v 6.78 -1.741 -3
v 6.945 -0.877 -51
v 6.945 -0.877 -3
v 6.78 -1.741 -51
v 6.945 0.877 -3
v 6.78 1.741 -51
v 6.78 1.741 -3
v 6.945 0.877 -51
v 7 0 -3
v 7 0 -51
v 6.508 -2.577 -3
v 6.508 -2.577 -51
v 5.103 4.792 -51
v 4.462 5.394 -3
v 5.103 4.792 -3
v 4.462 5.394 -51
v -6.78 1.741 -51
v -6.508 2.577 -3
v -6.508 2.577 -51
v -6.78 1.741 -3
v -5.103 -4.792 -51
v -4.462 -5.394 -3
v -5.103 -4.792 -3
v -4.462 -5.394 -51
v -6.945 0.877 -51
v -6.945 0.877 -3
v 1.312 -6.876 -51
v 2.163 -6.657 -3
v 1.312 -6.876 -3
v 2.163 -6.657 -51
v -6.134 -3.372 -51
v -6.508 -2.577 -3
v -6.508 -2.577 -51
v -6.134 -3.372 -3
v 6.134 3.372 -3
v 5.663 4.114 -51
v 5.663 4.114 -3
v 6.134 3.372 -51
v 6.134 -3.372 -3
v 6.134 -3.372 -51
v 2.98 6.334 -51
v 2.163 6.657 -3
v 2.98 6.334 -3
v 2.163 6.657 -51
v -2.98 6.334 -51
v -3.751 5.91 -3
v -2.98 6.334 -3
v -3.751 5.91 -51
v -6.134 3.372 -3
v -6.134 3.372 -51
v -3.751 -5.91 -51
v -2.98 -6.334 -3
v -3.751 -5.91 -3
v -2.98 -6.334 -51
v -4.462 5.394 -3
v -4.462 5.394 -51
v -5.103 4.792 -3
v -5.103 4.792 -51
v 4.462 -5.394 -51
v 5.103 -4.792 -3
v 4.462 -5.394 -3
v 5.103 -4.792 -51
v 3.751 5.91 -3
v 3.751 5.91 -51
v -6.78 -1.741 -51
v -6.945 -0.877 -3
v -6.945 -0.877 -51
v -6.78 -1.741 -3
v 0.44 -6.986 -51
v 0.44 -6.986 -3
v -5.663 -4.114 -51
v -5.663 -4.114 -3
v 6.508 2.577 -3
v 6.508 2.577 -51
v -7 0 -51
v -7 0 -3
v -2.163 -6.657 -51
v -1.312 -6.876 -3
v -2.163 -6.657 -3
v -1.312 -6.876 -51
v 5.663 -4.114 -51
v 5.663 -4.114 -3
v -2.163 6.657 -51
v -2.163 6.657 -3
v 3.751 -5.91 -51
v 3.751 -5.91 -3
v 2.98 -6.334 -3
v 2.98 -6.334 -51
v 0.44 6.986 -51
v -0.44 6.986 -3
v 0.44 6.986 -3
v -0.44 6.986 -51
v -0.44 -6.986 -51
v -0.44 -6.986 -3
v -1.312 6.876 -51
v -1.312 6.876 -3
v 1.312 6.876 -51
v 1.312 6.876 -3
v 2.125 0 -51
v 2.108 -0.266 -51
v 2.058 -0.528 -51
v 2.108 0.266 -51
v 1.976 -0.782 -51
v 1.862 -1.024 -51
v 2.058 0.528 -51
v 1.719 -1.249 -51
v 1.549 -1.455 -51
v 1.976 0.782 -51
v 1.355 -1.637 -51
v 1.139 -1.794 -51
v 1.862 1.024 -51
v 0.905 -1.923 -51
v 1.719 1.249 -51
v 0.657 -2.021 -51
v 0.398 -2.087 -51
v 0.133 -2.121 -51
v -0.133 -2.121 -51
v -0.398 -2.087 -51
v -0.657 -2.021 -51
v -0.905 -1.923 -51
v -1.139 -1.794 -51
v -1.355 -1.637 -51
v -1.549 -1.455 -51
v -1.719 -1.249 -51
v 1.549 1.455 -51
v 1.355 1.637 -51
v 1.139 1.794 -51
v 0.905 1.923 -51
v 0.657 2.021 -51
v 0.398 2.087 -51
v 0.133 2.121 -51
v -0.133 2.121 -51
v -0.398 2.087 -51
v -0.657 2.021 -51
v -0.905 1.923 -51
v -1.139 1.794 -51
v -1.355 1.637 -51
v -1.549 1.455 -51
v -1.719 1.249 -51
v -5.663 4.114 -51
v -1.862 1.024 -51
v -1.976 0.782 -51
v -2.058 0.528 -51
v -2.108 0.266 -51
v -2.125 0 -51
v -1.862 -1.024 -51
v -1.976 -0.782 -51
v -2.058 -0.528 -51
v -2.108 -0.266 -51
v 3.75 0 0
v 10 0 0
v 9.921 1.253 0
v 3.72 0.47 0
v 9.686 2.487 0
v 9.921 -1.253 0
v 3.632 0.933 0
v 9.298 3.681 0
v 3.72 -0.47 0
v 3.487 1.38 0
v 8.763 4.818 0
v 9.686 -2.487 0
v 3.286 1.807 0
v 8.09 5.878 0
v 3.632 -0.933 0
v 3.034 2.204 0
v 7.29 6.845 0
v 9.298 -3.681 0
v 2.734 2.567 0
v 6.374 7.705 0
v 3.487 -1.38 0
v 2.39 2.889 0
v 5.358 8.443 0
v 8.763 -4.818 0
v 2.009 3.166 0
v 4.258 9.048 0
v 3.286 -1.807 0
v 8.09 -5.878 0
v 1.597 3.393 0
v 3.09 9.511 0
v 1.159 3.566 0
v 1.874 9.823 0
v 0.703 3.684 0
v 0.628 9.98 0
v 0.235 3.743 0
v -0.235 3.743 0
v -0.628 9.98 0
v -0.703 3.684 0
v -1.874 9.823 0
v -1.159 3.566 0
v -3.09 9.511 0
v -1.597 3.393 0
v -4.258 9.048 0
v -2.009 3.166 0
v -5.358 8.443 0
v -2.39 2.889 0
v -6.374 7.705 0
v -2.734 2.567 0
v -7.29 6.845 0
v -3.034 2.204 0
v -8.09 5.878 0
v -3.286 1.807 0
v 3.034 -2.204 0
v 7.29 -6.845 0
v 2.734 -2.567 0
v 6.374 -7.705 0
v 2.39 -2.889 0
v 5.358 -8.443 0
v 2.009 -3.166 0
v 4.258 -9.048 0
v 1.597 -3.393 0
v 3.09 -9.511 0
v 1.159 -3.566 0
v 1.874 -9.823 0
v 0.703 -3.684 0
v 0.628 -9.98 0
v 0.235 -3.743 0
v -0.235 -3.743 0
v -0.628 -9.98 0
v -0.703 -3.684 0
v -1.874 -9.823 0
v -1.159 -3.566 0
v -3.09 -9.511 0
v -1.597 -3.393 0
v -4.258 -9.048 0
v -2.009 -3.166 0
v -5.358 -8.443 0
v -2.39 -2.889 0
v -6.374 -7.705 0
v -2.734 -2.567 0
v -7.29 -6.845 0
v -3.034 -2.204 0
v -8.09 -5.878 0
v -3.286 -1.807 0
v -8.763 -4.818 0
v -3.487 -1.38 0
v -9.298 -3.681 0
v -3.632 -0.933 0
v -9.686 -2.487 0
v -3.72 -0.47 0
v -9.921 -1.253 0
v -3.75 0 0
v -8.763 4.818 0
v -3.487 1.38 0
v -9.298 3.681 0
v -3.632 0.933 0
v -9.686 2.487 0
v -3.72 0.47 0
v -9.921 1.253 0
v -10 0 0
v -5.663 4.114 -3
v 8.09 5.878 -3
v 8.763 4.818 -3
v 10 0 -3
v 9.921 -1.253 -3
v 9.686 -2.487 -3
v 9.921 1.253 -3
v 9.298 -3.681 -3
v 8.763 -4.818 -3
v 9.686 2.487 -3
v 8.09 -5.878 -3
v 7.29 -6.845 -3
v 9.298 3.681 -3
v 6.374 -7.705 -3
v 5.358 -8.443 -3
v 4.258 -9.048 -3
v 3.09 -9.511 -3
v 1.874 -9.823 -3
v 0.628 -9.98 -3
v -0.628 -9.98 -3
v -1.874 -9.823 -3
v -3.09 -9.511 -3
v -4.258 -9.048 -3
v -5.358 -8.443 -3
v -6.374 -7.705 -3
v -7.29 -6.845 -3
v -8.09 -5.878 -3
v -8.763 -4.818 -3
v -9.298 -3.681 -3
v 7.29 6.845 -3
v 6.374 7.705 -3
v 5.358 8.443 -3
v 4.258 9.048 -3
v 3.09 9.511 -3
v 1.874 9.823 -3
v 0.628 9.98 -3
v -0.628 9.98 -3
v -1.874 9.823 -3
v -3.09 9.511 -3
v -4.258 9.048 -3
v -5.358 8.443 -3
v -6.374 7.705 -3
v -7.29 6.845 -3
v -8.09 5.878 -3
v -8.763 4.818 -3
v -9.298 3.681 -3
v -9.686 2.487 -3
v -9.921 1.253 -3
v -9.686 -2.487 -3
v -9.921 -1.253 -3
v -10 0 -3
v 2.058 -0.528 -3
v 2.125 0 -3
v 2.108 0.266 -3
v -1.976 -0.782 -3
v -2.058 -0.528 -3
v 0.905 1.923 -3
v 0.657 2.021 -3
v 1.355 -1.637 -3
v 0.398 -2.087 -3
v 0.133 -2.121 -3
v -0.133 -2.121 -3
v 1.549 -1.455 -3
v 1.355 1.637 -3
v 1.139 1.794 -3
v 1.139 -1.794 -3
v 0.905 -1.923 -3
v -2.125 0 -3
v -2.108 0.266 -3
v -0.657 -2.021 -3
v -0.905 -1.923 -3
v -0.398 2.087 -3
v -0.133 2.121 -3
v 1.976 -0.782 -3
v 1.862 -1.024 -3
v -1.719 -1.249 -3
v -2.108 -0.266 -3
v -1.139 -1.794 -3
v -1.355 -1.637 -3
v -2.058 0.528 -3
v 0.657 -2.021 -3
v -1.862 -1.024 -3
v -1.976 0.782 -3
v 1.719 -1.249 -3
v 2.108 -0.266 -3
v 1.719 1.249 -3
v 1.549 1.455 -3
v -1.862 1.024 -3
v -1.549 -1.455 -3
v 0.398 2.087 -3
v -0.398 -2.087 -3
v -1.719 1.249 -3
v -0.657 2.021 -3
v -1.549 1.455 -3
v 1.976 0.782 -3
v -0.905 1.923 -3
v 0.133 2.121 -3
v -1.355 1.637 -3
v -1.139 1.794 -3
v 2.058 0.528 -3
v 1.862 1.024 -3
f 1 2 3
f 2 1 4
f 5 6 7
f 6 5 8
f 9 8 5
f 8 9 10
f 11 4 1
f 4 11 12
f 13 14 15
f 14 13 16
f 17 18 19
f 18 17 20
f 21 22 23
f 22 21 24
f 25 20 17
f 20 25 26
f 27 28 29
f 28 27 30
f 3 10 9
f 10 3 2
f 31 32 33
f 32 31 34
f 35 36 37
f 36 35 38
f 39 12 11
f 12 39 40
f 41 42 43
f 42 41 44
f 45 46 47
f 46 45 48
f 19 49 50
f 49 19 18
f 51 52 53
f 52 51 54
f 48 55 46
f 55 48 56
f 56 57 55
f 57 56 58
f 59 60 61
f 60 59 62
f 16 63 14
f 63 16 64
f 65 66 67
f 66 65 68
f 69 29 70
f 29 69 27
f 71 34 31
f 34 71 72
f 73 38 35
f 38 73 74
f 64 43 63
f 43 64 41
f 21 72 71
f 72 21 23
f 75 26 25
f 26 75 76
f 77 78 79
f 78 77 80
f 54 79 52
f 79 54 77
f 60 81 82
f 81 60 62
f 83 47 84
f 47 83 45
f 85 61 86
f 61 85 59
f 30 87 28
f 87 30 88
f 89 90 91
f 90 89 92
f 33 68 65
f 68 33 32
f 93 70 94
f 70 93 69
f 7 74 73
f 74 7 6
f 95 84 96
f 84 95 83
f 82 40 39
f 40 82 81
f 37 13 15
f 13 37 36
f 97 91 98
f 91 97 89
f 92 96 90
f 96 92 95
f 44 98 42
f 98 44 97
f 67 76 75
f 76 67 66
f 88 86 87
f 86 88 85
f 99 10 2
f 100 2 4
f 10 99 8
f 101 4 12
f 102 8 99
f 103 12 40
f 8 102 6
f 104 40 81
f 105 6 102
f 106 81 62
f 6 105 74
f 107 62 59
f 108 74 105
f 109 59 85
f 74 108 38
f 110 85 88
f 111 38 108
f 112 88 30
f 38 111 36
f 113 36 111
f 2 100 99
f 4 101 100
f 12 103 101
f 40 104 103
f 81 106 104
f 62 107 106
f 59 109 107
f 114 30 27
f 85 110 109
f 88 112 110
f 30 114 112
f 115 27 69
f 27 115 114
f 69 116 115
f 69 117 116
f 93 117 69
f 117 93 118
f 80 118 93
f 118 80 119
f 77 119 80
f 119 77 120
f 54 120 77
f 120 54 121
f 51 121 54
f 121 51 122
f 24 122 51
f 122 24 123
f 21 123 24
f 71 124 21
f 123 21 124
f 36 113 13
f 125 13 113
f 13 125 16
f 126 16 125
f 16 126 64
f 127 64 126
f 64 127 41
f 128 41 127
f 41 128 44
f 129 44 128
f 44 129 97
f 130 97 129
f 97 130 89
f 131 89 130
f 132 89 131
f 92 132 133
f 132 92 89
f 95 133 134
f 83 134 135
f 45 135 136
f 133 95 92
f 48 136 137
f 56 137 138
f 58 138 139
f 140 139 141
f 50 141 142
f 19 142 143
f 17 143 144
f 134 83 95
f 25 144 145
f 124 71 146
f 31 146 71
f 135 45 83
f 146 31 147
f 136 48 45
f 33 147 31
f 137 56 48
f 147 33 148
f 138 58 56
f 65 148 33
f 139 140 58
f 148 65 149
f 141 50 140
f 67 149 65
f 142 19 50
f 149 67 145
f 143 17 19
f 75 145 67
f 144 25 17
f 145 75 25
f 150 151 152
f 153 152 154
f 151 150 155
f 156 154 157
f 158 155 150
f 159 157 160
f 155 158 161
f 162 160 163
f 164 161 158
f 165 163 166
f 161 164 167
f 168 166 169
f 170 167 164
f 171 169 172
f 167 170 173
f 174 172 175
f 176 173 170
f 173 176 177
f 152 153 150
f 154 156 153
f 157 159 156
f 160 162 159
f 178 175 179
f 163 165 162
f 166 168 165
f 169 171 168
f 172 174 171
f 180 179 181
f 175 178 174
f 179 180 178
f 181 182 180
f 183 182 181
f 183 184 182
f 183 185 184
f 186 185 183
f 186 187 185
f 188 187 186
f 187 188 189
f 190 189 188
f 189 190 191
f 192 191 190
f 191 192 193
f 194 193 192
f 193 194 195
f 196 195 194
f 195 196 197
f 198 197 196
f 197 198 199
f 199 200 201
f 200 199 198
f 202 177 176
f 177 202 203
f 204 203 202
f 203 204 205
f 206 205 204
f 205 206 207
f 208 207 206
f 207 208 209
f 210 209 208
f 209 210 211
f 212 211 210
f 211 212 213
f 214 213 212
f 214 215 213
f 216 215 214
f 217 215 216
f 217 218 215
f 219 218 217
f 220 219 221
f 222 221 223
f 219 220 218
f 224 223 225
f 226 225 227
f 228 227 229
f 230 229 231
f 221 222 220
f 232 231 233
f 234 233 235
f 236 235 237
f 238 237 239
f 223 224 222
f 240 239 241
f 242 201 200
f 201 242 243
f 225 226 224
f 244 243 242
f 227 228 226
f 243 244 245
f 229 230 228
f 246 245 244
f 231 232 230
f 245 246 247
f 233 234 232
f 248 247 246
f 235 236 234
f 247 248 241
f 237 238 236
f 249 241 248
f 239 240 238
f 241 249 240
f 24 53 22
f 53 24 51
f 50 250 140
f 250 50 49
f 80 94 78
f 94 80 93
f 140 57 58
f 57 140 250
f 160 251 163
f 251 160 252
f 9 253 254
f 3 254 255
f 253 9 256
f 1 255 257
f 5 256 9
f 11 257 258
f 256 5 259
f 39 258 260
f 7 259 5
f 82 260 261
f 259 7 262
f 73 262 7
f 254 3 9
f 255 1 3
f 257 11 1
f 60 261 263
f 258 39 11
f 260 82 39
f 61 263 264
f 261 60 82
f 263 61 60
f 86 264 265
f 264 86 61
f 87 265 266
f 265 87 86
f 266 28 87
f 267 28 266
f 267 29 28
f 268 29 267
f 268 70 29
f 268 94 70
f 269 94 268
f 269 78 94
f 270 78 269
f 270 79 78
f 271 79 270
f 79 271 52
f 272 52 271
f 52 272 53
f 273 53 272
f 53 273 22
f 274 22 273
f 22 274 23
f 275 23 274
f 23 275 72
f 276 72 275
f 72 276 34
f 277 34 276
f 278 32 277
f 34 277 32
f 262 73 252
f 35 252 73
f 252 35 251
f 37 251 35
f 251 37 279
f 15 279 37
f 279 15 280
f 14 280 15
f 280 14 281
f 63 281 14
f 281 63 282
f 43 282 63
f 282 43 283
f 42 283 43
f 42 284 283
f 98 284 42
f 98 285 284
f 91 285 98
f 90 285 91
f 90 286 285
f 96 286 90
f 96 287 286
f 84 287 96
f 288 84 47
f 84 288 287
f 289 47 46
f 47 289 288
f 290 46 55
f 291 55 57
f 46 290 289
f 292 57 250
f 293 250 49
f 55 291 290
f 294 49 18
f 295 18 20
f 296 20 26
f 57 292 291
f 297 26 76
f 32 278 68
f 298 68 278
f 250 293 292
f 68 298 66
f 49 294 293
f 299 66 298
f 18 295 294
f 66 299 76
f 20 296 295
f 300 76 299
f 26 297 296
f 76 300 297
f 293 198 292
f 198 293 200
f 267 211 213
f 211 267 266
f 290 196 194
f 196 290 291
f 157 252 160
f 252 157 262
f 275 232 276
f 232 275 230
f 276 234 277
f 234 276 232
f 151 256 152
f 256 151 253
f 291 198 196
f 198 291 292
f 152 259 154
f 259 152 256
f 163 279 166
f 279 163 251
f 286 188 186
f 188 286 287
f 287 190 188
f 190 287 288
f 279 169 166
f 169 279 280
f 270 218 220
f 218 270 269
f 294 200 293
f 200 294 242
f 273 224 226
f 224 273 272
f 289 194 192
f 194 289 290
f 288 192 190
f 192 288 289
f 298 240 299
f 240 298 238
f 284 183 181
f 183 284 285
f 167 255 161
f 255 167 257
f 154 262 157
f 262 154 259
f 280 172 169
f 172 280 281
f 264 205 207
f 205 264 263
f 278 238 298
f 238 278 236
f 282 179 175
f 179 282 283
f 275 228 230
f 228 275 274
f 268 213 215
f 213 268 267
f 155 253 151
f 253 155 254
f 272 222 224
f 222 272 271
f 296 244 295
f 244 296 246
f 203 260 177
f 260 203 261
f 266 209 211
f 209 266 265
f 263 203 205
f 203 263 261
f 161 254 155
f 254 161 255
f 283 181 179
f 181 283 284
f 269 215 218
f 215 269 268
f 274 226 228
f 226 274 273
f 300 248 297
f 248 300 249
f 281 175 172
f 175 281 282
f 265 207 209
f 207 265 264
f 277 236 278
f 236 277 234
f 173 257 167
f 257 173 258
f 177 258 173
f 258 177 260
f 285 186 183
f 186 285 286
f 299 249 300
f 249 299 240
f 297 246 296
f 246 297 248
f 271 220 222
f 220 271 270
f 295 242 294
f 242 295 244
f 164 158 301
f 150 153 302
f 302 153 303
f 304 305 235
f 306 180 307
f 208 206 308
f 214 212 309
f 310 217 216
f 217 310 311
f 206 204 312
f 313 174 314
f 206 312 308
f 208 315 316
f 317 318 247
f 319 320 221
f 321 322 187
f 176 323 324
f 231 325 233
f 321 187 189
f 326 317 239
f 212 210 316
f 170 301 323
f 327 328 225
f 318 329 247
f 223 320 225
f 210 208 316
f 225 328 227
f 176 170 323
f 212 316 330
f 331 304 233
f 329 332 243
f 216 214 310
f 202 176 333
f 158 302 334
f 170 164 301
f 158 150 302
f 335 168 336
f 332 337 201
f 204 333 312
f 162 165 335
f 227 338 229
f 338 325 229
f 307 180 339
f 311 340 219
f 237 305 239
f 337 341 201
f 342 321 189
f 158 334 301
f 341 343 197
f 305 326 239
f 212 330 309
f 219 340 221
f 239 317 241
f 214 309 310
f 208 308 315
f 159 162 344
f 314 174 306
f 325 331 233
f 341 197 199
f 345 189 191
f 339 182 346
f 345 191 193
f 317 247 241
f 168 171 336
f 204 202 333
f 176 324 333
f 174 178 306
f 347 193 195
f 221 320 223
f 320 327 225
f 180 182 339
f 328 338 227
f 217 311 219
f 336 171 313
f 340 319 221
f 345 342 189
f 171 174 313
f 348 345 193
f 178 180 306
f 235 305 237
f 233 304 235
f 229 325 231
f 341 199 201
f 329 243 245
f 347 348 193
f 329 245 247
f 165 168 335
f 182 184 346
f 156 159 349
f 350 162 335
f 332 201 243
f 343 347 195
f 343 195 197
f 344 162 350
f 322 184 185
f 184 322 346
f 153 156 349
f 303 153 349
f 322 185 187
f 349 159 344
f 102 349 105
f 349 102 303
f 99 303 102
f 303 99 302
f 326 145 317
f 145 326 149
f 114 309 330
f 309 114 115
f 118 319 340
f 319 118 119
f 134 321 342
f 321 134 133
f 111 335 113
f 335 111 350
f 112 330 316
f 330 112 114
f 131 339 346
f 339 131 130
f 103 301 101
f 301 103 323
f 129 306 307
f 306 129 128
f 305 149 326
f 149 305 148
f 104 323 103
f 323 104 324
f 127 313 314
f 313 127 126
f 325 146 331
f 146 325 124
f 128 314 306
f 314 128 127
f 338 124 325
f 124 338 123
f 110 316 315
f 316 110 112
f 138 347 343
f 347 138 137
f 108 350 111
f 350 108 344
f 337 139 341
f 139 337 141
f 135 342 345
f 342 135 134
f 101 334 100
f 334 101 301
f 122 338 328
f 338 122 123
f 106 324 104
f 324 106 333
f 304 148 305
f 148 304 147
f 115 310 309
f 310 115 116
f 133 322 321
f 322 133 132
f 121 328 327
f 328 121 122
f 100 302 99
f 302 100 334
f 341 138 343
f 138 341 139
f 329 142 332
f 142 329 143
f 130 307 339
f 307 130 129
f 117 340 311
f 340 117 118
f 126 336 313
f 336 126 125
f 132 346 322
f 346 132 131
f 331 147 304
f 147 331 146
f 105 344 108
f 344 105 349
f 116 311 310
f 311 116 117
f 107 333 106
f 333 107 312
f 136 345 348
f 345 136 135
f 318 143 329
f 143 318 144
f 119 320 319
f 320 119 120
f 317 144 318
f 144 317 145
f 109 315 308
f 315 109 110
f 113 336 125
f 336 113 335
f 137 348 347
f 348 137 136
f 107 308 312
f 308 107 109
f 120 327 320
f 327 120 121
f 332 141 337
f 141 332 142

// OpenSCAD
$fn = 50;


difference() {
	union() {
		translate(v = [0, 0, -51.0000000000]) {
			cylinder(h = 51, r = 7.0000000000);
		}
		translate(v = [0, 0, -3.0000000000]) {
			cylinder(h = 3, r = 10.0000000000);
		}
	}
	union() {
		translate(v = [0, 0, 0]) {
			rotate(a = [0, 0, 0]) {
				difference() {
					union() {
						#translate(v = [0, 0, -51.0000000000]) {
							cylinder(h = 51, r = 2.0000000000);
						}
						#translate(v = [0, 0, -3]) {
							cylinder(h = 3, r = 7.0000000000, r1 = 2.1250000000, r2 = 3.7500000000);
						}
						#translate(v = [0, 0, -51.0000000000]) {
							cylinder(h = 51, r = 2.1250000000);
						}
						#translate(v = [0, 0, -51.0000000000]) {
							cylinder(h = 51, r = 2.0000000000);
						}
					}
					union();
				}
			}
		}
	}
}
